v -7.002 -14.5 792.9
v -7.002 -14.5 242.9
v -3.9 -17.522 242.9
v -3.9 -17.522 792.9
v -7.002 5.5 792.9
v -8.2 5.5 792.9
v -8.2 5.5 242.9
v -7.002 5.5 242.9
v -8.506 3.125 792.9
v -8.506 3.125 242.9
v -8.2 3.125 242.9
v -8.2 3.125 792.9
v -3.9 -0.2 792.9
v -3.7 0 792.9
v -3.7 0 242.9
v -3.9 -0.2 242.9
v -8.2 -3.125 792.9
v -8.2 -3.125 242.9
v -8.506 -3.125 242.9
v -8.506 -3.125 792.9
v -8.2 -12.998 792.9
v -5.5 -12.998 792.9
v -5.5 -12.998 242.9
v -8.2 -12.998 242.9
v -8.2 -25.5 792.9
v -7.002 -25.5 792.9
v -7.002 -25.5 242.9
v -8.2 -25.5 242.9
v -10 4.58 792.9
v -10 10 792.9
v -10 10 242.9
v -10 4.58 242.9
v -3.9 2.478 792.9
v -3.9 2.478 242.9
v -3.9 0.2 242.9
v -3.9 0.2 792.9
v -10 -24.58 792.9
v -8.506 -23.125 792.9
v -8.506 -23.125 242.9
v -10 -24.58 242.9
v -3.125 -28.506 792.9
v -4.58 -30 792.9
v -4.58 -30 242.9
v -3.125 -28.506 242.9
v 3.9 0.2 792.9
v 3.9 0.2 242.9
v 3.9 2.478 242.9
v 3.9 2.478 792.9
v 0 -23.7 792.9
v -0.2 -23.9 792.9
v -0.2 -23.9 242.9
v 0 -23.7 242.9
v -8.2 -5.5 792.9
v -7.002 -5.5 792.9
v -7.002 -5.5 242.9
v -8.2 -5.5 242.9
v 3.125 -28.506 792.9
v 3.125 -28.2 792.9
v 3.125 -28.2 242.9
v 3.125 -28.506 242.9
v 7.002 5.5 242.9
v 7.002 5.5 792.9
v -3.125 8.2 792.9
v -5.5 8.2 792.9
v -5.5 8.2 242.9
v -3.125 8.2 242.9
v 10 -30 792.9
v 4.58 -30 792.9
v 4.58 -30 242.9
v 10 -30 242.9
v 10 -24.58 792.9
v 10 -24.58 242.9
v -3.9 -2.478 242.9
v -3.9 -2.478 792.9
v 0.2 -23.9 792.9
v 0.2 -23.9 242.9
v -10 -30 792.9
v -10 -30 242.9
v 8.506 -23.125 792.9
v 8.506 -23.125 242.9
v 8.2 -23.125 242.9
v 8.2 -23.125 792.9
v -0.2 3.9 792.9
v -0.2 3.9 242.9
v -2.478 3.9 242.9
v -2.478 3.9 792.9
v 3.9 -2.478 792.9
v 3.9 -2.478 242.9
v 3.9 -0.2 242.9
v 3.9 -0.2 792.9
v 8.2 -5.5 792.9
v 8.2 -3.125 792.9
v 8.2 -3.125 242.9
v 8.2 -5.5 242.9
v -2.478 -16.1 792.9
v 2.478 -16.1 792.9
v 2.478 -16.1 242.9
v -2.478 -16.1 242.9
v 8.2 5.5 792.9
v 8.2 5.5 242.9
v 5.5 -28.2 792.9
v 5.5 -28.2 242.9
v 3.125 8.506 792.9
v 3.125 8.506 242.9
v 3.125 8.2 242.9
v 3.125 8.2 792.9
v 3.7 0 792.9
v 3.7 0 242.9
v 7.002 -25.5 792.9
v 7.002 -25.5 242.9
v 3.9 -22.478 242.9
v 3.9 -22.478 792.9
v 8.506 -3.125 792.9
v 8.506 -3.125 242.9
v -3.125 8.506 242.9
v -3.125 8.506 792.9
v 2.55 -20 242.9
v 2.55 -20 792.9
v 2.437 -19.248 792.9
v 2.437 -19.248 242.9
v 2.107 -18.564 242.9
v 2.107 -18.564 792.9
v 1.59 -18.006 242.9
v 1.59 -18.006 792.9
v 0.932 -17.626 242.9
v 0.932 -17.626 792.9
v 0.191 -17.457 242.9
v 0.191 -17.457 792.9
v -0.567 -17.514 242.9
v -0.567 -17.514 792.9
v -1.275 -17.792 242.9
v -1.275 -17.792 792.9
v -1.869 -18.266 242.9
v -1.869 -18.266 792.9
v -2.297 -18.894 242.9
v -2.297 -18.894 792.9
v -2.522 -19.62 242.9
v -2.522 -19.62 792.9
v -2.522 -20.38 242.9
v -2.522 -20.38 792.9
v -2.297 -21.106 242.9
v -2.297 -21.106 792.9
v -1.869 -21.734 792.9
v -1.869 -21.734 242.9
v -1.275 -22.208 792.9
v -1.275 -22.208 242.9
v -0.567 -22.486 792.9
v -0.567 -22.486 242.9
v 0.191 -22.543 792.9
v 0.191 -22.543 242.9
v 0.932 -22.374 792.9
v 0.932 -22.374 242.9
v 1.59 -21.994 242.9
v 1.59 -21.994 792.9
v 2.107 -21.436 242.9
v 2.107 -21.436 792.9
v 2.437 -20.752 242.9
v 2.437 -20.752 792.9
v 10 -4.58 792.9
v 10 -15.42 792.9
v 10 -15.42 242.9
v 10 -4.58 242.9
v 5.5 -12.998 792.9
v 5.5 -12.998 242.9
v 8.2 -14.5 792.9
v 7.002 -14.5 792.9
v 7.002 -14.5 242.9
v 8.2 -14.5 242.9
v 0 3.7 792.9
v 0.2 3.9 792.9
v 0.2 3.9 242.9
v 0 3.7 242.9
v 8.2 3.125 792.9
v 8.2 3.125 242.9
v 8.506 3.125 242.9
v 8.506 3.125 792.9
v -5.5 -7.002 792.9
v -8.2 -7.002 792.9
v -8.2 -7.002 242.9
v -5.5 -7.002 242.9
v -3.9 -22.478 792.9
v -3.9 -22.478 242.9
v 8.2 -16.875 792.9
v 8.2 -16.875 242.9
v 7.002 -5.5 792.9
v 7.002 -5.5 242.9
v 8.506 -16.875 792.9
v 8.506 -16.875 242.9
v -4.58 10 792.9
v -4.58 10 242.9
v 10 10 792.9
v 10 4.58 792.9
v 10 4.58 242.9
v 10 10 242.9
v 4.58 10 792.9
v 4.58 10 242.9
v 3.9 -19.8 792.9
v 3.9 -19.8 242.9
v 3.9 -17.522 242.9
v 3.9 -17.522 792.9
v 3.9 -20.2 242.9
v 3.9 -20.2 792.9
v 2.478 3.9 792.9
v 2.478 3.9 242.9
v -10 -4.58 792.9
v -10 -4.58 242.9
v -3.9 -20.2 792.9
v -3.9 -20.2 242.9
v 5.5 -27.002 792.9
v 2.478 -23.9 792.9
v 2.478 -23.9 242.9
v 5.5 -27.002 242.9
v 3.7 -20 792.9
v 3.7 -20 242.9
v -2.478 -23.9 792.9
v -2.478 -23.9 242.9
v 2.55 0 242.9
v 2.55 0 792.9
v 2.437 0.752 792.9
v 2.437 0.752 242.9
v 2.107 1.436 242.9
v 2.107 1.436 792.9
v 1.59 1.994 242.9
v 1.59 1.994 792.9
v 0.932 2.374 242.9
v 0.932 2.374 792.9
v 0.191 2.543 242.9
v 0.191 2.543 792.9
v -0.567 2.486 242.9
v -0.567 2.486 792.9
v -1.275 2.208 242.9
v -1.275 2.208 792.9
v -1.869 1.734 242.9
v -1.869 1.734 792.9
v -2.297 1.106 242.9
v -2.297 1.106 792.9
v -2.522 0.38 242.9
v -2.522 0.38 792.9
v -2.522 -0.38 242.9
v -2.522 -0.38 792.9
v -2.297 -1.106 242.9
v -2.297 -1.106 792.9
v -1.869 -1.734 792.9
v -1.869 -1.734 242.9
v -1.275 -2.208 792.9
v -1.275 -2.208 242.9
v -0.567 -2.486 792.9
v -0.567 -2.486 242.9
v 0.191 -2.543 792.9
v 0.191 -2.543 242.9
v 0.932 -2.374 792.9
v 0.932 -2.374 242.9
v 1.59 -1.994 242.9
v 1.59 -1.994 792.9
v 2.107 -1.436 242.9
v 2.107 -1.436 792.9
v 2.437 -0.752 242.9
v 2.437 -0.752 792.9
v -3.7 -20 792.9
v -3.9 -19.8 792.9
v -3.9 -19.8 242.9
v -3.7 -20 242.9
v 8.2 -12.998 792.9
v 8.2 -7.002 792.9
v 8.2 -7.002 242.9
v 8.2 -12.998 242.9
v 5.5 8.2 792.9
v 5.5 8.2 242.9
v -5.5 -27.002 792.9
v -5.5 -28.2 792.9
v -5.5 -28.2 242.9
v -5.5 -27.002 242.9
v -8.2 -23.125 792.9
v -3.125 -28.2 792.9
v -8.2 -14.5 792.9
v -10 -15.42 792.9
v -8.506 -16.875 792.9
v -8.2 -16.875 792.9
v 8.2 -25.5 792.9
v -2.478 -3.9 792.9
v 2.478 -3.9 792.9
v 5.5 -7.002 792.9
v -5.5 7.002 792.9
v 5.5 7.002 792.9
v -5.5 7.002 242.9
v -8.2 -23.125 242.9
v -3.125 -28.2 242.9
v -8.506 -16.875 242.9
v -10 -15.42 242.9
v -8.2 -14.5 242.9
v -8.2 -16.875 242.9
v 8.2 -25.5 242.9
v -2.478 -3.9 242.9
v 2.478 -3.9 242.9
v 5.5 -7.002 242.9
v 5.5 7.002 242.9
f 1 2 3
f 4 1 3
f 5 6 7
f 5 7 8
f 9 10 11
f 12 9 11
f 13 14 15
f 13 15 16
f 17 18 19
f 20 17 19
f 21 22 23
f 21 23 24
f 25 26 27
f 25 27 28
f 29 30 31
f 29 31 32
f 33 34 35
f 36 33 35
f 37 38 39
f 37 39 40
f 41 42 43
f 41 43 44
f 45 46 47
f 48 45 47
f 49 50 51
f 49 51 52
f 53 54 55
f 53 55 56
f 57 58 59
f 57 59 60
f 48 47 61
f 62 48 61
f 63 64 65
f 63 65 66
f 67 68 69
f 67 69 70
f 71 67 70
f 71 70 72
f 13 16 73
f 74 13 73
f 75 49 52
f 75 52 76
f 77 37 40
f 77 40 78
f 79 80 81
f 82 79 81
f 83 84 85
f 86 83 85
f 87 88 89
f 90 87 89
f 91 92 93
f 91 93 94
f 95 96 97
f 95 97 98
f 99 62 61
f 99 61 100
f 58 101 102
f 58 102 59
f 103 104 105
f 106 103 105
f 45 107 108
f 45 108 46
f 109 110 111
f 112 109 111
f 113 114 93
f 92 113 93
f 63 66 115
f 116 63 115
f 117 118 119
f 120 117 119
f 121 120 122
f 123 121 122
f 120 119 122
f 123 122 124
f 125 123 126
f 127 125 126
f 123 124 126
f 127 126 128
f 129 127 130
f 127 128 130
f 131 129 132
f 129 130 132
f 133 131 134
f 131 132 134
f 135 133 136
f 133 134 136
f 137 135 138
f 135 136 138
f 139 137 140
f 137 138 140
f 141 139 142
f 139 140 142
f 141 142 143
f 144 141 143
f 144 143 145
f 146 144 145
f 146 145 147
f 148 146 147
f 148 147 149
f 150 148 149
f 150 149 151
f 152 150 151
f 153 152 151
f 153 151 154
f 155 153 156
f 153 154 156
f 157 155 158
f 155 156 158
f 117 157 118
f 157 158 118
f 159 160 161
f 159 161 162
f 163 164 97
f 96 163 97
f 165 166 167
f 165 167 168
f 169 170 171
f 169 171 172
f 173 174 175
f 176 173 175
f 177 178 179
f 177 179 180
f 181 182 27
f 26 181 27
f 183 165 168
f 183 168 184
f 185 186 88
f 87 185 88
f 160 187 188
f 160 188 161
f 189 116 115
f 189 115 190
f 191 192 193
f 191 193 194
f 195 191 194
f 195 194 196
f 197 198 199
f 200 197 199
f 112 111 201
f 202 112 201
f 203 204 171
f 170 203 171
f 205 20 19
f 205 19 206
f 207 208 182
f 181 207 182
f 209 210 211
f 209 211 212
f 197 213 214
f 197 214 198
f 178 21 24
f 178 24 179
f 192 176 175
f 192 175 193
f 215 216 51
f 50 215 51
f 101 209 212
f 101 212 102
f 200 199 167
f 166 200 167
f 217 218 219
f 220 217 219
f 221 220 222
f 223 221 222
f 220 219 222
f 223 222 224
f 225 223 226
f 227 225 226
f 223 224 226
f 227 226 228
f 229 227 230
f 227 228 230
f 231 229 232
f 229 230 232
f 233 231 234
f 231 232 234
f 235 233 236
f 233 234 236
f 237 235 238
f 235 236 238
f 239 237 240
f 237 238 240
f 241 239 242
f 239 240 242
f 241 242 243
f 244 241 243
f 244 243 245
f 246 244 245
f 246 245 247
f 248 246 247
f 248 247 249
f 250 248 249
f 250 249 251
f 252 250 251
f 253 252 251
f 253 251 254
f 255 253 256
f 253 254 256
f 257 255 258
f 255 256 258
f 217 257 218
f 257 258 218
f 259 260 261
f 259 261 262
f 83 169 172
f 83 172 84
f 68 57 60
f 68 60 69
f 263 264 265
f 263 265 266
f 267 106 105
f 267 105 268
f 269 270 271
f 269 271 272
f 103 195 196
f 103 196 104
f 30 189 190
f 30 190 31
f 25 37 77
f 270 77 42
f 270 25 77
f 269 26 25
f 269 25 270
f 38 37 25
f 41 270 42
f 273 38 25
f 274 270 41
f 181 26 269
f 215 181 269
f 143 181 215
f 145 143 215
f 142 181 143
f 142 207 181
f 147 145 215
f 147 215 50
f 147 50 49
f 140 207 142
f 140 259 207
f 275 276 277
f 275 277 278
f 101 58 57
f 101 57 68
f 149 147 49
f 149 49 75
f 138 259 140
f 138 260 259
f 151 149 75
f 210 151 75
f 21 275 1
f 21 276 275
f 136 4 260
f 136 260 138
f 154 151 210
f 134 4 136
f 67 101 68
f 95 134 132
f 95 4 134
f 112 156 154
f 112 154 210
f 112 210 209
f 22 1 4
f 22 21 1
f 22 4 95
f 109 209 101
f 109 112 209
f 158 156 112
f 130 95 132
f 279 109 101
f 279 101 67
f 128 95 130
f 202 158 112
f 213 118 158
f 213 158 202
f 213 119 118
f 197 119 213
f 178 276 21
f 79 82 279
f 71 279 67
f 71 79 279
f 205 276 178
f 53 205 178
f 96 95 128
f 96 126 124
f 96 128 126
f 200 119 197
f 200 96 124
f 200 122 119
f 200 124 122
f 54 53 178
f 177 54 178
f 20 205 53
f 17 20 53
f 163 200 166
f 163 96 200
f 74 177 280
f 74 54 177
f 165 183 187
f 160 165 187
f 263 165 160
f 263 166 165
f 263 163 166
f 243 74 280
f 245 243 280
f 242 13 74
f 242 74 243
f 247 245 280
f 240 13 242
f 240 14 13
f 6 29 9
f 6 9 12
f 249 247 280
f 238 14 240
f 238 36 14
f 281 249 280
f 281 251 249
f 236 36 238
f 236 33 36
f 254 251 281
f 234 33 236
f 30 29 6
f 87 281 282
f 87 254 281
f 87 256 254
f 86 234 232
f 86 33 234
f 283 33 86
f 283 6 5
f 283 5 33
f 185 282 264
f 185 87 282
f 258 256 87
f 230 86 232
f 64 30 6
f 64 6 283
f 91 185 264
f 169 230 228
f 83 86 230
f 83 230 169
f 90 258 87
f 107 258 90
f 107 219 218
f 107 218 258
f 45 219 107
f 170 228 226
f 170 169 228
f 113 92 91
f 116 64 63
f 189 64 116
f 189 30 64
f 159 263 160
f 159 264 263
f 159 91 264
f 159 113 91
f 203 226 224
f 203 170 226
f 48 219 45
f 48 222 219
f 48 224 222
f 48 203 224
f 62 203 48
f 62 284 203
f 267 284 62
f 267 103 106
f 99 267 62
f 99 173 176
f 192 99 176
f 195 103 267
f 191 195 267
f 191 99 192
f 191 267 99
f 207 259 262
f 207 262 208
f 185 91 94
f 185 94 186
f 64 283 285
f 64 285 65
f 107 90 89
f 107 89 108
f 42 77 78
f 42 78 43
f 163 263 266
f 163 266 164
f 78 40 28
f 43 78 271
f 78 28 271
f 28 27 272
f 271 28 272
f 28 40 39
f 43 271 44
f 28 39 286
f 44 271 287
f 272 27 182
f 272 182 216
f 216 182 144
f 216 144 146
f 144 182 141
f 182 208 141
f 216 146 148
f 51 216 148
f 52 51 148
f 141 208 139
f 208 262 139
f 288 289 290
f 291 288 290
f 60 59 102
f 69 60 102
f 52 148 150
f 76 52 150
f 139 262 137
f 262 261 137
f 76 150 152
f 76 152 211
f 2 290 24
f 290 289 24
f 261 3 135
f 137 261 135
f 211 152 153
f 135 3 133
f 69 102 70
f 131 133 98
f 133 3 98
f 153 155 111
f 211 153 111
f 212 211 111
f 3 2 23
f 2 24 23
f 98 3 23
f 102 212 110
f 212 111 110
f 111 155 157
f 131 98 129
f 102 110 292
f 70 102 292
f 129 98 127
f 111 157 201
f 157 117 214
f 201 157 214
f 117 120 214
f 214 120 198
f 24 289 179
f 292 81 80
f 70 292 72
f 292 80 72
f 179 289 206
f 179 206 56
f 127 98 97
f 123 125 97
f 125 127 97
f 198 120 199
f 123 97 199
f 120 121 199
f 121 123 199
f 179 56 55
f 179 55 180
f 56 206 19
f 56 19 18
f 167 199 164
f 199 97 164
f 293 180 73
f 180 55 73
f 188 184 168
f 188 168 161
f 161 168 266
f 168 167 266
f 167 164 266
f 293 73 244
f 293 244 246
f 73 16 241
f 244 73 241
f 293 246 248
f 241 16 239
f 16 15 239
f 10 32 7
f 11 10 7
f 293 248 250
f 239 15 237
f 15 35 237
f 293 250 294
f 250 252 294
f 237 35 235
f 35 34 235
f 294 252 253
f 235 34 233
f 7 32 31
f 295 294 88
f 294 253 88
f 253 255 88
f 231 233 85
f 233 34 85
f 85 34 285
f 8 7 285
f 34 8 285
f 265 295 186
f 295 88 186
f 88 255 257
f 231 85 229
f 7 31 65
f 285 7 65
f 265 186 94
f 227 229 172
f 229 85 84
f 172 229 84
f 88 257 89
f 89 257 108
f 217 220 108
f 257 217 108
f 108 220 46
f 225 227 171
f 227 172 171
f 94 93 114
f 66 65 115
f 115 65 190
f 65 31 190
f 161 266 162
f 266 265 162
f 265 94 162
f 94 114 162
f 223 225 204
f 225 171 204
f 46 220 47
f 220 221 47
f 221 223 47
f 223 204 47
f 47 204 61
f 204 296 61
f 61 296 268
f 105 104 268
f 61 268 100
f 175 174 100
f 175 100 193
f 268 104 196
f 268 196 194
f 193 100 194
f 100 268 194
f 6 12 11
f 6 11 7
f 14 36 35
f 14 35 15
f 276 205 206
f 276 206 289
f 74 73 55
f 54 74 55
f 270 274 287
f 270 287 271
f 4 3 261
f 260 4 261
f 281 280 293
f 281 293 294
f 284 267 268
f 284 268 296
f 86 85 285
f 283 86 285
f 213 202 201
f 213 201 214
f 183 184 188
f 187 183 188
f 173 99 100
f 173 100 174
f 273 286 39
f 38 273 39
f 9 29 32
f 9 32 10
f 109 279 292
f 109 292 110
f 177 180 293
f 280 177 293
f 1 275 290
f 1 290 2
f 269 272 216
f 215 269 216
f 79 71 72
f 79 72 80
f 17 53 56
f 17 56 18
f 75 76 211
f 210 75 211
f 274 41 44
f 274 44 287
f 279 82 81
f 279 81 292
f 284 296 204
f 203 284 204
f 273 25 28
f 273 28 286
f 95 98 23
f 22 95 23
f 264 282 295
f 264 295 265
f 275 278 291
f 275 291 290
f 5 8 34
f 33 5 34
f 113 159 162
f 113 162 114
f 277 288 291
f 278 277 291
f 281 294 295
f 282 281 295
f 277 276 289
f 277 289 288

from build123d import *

# Parameters (mm, degrees)
SKETCH_1_R      = 2.55
EXTRUDE_1_DEPTH = 550


with BuildPart() as part:
    # Эскиз1 → Бобышка-Вытянуть1 (new body)
    with BuildSketch(Plane.XY.offset(792.9)):
        Polygon((-8.2, -3.125), (-8.506400721, -3.125), (-10, -4.58), (-10, -15.42), (-8.506400721, -16.875), (-8.2, -16.875), (-8.2, -14.5), (-7.00202244, -14.5), (-3.9, -17.521856474), (-3.9, -19.8), (-3.7, -20), (-3.9, -20.2), (-3.9, -22.478143526), (-7.00202244, -25.5), (-8.2, -25.5), (-8.2, -23.125), (-8.506400721, -23.125), (-10, -24.58), (-10, -30), (-4.58, -30), (-3.125, -28.506400721), (-3.125, -28.2), (-5.5, -28.2), (-5.5, -27.00202244), (-2.478143526, -23.9), (-0.2, -23.9), (0, -23.7), (0.2, -23.9), (2.478143526, -23.9), (5.5, -27.00202244), (5.5, -28.2), (3.125, -28.2), (3.125, -28.506400721), (4.58, -30), (10, -30), (10, -24.58), (8.506400721, -23.125), (8.2, -23.125), (8.2, -25.5), (7.00202244, -25.5), (3.9, -22.478143526), (3.9, -20.2), (3.7, -20), (3.9, -19.8), (3.9, -17.521856474), (7.00202244, -14.5), (8.2, -14.5), (8.2, -16.875), (8.506400721, -16.875), (10, -15.42), (10, -4.58), (8.506400721, -3.125), (8.2, -3.125), (8.2, -5.5), (7.00202244, -5.5), (3.9, -2.478143526), (3.9, -0.2), (3.7, 0), (3.9, 0.2), (3.9, 2.478143526), (7.00202244, 5.5), (8.2, 5.5), (8.2, 3.125), (8.506400721, 3.125), (10, 4.58), (10, 10), (4.58, 10), (3.125, 8.506400721), (3.125, 8.2), (5.5, 8.2), (5.5, 7.00202244), (2.478143526, 3.9), (0.2, 3.9), (0, 3.7), (-0.2, 3.9), (-2.478143526, 3.9), (-5.5, 7.00202244), (-5.5, 8.2), (-3.125, 8.2), (-3.125, 8.506400721), (-4.58, 10), (-10, 10), (-10, 4.58), (-8.506400721, 3.125), (-8.2, 3.125), (-8.2, 5.5), (-7.00202244, 5.5), (-3.9, 2.478143526), (-3.9, 0.2), (-3.7, 0), (-3.9, -0.2), (-3.9, -2.478143526), (-7.00202244, -5.5), (-8.2, -5.5), align=None)
        Circle(SKETCH_1_R, mode=Mode.SUBTRACT)
        with Locations((0, -20)):
            Circle(SKETCH_1_R, mode=Mode.SUBTRACT)
        Polygon((-2.478143526, -3.9), (2.478143526, -3.9), (5.5, -7.00202244), (8.2, -7.00202244), (8.2, -12.99797756), (5.5, -12.99797756), (2.478143526, -16.1), (-2.478143526, -16.1), (-5.5, -12.99797756), (-8.2, -12.99797756), (-8.2, -7.00202244), (-5.5, -7.00202244), align=None, mode=Mode.SUBTRACT)
    extrude(amount=-EXTRUDE_1_DEPTH)


solid = part.part
